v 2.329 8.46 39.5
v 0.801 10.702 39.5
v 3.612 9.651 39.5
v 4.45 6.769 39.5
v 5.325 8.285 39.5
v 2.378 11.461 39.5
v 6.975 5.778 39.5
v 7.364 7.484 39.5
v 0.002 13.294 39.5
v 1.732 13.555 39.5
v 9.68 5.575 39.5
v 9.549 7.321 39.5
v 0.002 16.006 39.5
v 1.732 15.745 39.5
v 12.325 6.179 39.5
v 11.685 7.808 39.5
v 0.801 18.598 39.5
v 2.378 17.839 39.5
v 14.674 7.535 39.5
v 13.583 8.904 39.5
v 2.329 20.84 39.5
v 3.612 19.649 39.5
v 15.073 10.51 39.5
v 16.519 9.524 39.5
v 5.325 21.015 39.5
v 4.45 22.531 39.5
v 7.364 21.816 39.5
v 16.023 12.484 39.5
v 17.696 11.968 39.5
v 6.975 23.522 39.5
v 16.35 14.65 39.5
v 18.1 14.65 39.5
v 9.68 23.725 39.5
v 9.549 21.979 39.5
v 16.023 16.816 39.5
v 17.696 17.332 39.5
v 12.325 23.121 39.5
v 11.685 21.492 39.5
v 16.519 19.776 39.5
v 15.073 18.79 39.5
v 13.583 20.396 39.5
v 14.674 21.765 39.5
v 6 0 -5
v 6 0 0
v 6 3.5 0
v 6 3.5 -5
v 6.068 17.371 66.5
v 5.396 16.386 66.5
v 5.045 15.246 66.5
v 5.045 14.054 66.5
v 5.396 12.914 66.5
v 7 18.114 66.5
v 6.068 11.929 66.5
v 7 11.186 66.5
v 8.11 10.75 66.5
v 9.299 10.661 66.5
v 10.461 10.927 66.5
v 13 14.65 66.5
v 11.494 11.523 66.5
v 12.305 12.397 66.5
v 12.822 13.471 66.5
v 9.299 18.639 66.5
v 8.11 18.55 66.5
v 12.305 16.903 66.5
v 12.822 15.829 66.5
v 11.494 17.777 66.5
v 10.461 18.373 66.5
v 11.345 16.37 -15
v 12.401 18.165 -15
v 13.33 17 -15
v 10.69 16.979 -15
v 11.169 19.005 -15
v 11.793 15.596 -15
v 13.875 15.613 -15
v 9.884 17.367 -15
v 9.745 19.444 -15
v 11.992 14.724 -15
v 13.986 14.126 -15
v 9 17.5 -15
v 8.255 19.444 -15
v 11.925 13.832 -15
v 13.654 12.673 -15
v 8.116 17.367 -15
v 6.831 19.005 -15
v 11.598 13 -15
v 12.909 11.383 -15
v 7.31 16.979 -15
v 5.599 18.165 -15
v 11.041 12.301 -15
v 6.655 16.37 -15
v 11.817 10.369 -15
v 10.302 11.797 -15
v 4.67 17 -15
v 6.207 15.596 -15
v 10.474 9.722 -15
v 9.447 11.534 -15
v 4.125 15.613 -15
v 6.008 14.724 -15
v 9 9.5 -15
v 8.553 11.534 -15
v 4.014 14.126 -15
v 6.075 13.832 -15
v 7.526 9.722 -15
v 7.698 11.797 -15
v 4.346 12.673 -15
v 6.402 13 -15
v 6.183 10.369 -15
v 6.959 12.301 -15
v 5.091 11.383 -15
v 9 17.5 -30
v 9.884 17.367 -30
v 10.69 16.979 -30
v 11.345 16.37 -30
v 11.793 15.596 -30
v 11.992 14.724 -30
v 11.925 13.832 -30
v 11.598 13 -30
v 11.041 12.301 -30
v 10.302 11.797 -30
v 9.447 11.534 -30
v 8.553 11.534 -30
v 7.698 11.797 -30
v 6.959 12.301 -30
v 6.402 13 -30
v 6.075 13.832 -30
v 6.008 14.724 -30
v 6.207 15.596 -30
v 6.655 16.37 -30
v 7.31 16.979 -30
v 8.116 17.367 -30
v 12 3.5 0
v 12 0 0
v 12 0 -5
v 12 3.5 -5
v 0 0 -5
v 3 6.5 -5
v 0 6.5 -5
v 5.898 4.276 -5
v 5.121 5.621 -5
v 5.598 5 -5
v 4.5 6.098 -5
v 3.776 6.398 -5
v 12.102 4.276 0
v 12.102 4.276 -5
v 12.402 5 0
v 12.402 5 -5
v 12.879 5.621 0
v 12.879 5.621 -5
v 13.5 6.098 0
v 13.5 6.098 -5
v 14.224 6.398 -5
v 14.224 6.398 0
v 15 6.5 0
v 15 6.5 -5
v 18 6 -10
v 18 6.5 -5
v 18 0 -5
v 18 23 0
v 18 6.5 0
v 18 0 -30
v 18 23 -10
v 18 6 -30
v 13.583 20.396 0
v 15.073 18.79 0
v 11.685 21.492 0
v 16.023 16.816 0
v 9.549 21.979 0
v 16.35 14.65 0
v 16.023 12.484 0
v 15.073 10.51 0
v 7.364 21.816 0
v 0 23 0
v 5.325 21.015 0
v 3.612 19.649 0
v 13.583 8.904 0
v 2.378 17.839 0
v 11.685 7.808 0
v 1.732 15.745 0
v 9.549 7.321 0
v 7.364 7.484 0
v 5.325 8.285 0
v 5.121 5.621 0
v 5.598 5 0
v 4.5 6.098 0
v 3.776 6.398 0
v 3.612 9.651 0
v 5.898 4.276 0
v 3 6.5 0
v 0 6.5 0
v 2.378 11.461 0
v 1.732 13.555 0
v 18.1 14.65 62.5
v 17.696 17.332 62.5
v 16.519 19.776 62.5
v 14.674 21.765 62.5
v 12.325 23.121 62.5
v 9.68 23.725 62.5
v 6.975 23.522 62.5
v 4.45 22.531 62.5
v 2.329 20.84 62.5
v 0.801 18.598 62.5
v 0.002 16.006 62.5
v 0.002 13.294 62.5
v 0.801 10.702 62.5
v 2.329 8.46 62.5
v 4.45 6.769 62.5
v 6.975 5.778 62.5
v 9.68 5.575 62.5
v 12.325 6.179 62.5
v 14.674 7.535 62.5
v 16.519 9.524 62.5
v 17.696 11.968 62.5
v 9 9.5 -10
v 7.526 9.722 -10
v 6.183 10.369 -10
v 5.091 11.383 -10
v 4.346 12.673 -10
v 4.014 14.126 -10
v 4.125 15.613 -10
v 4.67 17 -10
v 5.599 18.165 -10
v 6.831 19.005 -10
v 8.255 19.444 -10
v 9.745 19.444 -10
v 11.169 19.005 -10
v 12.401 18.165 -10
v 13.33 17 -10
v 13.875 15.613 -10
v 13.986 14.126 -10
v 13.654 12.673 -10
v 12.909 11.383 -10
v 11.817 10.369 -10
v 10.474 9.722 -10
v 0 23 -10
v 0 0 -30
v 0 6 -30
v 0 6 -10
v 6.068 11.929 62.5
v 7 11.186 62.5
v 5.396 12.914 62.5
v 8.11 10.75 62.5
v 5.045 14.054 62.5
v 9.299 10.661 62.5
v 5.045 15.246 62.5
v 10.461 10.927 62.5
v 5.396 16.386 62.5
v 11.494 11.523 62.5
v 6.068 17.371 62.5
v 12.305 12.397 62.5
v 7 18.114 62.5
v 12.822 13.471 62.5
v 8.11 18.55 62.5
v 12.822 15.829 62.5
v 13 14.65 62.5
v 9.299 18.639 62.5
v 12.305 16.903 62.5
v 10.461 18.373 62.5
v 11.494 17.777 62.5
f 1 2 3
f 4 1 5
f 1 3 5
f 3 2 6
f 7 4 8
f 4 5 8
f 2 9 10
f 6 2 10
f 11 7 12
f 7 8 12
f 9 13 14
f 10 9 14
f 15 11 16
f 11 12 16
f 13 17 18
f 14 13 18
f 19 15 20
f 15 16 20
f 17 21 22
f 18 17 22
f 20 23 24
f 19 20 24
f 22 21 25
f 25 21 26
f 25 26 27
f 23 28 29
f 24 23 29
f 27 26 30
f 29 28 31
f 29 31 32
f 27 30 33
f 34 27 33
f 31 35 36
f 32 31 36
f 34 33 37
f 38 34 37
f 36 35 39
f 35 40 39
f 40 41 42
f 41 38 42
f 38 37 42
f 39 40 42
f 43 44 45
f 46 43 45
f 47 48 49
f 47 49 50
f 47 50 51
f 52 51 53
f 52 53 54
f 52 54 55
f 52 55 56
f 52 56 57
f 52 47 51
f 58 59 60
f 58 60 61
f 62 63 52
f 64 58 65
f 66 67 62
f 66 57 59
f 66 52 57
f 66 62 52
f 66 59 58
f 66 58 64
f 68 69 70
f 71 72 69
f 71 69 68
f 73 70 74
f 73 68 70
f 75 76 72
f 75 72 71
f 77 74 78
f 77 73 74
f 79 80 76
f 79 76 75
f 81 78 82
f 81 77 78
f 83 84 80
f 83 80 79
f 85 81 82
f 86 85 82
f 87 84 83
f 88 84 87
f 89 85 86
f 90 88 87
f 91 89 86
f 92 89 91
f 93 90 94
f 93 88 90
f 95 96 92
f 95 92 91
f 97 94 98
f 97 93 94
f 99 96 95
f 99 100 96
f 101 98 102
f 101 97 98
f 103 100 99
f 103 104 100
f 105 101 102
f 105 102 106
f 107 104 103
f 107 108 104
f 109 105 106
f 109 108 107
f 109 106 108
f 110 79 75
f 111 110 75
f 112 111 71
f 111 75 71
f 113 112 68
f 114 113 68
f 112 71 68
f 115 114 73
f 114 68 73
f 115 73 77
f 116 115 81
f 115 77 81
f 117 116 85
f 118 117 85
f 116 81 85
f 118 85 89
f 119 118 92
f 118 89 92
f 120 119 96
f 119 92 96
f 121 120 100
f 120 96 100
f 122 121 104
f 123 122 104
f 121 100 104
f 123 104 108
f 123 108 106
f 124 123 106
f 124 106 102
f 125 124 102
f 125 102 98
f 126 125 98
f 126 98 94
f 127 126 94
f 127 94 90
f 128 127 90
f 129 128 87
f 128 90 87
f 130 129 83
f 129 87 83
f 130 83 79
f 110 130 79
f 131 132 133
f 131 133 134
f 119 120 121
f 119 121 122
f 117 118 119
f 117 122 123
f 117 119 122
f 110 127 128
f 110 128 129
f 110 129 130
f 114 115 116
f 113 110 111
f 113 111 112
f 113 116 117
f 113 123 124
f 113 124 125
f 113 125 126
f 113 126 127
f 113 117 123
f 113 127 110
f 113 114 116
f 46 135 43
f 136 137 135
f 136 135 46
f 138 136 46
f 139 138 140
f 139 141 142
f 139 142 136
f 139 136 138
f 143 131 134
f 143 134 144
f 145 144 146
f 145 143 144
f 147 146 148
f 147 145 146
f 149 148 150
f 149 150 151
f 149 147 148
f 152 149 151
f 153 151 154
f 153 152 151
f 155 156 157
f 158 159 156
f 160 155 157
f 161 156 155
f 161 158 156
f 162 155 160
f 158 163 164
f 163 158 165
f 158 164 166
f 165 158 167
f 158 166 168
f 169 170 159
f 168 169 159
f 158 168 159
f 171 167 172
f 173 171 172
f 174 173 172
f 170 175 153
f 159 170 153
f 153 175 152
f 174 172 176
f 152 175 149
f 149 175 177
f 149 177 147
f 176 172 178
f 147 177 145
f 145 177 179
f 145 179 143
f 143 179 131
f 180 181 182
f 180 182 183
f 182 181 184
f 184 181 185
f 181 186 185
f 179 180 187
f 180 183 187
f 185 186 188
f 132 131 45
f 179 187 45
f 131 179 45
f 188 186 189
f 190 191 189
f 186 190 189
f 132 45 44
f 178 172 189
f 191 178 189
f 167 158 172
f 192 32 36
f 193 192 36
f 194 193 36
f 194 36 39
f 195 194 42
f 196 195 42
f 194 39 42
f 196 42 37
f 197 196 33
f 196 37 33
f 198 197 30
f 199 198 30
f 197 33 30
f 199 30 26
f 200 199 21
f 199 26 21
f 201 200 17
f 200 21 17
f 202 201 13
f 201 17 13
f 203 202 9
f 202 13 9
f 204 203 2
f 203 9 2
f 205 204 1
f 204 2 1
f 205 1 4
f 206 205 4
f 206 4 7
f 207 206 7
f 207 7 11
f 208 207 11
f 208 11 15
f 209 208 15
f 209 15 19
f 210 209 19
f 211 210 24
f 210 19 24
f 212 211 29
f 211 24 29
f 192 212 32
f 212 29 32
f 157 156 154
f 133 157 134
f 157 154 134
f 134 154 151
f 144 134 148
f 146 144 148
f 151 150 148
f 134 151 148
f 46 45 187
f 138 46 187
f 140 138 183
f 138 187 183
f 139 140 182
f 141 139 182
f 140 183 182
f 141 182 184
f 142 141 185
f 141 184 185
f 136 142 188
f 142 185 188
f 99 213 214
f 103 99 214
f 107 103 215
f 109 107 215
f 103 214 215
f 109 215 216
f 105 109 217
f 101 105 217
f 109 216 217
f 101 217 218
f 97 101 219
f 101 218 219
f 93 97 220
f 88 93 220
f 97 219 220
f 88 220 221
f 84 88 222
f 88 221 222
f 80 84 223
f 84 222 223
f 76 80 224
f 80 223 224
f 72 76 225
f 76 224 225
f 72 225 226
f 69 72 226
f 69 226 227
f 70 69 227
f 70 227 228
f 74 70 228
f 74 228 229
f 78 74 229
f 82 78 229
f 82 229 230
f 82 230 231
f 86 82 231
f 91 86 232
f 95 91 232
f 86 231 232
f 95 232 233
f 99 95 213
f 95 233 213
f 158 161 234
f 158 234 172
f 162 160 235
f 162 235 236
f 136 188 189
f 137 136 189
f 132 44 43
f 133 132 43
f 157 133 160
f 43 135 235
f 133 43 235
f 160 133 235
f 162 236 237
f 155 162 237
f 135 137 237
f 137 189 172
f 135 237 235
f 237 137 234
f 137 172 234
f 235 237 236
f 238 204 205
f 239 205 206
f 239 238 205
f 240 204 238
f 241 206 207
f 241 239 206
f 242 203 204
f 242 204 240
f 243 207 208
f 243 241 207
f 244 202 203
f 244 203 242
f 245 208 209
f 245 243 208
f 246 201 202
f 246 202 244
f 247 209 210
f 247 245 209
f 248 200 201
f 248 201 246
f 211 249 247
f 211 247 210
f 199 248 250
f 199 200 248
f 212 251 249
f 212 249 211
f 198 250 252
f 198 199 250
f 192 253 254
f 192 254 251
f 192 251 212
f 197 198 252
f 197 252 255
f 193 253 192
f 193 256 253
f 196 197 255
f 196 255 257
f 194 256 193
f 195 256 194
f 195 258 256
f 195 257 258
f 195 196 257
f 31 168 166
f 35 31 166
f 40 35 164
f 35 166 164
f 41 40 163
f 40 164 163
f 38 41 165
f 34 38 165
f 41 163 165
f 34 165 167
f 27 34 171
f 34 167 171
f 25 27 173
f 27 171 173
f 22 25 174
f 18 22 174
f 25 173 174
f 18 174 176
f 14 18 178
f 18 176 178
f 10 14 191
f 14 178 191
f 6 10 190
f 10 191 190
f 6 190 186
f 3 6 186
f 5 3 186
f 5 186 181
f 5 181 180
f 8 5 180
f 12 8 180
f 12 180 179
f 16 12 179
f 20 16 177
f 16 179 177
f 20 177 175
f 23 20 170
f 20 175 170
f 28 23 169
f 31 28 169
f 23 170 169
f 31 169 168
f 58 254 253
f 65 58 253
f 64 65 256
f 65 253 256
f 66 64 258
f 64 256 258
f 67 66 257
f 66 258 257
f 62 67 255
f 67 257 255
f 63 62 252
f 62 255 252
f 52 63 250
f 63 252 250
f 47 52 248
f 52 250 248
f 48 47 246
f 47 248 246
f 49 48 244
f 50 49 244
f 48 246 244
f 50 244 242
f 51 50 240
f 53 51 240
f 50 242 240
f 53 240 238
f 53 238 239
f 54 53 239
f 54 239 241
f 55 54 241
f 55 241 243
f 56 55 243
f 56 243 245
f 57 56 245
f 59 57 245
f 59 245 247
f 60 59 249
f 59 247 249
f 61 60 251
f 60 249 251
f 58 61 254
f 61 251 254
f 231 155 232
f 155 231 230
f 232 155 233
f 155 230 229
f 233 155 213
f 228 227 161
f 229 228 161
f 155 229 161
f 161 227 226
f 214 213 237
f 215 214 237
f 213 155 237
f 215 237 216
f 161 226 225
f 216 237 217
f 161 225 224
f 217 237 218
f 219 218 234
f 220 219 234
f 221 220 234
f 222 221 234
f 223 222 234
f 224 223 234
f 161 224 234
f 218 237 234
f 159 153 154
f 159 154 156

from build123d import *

# Parameters (mm, degrees)
BOSS_EXTRUDE1_DEPTH = 18
CUT_EXTRUDE1_DEPTH  = 5
SKETCH4_R           = 5
BOSS_EXTRUDE2_DEPTH = 5
SKETCH5_R           = 3
BOSS_EXTRUDE3_DEPTH = 15
SKETCH6_R           = 7.35
BOSS_EXTRUDE4_DEPTH = 39.5
SKETCH7_R           = 9.1
BOSS_EXTRUDE5_DEPTH = 23
SKETCH8_R           = 4
BOSS_EXTRUDE6_DEPTH = 4


with BuildPart() as part:
    # Sketch1 → Boss-Extrude1 (new body)
    with BuildSketch(Plane(origin=(0, 0, 0), x_dir=(0, 0, -1), z_dir=(1, 0, 0))):
        Polygon((0, 0), (30, 0), (30, 6), (10, 6), (10, 23), (0, 23), align=None)
    extrude(amount=BOSS_EXTRUDE1_DEPTH)

    # Sketch2 → Cut-Extrude1 (cut)
    with BuildSketch(Plane.XY):
        with BuildLine():
            Line((12, 0), (12, 3.5))
            ThreePointArc((12, 3.5), (12.878679656, 5.621320344), (15, 6.5))
            Line((15, 6.5), (18, 6.5))
            Line((18, 6.5), (18, 0))
            Line((18, 0), (12, 0))
        make_face()
        with BuildLine():
            Line((6, 0), (6, 3.5))
            ThreePointArc((6, 3.5), (5.121320344, 5.621320344), (3, 6.5))
            Line((3, 6.5), (0, 6.5))
            Line((0, 6.5), (0, 0))
            Line((0, 0), (6, 0))
        make_face()
    extrude(amount=-CUT_EXTRUDE1_DEPTH, mode=Mode.SUBTRACT)

    # Sketch4 → Boss-Extrude2 (add)
    with BuildSketch(Plane(origin=(0, 0, -10), x_dir=(-1, 0, 0), z_dir=(0, 0, -1))):
        with Locations(Location((-9, 14.5, 0), (0, 0, 270))):
            Circle(SKETCH4_R)
    extrude(amount=BOSS_EXTRUDE2_DEPTH)

    # Sketch5 → Boss-Extrude3 (add)
    with BuildSketch(Plane(origin=(0, 0, -15), x_dir=(-1, 0, 0), z_dir=(0, 0, -1))):
        with Locations(Location((-9, 14.5, 0), (0, 0, 90))):
            Circle(SKETCH5_R)
    extrude(amount=BOSS_EXTRUDE3_DEPTH)

    # Sketch6 → Boss-Extrude4 (add)
    with BuildSketch(Plane.XY):
        with Locations((9, 14.65)):
            Circle(SKETCH6_R)
    extrude(amount=BOSS_EXTRUDE4_DEPTH)

    # Sketch7 → Boss-Extrude5 (add)
    with BuildSketch(Plane.XY.offset(39.5)):
        with Locations((9, 14.65)):
            Circle(SKETCH7_R)
    extrude(amount=BOSS_EXTRUDE5_DEPTH)

    # Sketch8 → Boss-Extrude6 (add)
    with BuildSketch(Plane.XY.offset(62.5)):
        with Locations((9, 14.65)):
            Circle(SKETCH8_R)
    extrude(amount=BOSS_EXTRUDE6_DEPTH)


solid = part.part
